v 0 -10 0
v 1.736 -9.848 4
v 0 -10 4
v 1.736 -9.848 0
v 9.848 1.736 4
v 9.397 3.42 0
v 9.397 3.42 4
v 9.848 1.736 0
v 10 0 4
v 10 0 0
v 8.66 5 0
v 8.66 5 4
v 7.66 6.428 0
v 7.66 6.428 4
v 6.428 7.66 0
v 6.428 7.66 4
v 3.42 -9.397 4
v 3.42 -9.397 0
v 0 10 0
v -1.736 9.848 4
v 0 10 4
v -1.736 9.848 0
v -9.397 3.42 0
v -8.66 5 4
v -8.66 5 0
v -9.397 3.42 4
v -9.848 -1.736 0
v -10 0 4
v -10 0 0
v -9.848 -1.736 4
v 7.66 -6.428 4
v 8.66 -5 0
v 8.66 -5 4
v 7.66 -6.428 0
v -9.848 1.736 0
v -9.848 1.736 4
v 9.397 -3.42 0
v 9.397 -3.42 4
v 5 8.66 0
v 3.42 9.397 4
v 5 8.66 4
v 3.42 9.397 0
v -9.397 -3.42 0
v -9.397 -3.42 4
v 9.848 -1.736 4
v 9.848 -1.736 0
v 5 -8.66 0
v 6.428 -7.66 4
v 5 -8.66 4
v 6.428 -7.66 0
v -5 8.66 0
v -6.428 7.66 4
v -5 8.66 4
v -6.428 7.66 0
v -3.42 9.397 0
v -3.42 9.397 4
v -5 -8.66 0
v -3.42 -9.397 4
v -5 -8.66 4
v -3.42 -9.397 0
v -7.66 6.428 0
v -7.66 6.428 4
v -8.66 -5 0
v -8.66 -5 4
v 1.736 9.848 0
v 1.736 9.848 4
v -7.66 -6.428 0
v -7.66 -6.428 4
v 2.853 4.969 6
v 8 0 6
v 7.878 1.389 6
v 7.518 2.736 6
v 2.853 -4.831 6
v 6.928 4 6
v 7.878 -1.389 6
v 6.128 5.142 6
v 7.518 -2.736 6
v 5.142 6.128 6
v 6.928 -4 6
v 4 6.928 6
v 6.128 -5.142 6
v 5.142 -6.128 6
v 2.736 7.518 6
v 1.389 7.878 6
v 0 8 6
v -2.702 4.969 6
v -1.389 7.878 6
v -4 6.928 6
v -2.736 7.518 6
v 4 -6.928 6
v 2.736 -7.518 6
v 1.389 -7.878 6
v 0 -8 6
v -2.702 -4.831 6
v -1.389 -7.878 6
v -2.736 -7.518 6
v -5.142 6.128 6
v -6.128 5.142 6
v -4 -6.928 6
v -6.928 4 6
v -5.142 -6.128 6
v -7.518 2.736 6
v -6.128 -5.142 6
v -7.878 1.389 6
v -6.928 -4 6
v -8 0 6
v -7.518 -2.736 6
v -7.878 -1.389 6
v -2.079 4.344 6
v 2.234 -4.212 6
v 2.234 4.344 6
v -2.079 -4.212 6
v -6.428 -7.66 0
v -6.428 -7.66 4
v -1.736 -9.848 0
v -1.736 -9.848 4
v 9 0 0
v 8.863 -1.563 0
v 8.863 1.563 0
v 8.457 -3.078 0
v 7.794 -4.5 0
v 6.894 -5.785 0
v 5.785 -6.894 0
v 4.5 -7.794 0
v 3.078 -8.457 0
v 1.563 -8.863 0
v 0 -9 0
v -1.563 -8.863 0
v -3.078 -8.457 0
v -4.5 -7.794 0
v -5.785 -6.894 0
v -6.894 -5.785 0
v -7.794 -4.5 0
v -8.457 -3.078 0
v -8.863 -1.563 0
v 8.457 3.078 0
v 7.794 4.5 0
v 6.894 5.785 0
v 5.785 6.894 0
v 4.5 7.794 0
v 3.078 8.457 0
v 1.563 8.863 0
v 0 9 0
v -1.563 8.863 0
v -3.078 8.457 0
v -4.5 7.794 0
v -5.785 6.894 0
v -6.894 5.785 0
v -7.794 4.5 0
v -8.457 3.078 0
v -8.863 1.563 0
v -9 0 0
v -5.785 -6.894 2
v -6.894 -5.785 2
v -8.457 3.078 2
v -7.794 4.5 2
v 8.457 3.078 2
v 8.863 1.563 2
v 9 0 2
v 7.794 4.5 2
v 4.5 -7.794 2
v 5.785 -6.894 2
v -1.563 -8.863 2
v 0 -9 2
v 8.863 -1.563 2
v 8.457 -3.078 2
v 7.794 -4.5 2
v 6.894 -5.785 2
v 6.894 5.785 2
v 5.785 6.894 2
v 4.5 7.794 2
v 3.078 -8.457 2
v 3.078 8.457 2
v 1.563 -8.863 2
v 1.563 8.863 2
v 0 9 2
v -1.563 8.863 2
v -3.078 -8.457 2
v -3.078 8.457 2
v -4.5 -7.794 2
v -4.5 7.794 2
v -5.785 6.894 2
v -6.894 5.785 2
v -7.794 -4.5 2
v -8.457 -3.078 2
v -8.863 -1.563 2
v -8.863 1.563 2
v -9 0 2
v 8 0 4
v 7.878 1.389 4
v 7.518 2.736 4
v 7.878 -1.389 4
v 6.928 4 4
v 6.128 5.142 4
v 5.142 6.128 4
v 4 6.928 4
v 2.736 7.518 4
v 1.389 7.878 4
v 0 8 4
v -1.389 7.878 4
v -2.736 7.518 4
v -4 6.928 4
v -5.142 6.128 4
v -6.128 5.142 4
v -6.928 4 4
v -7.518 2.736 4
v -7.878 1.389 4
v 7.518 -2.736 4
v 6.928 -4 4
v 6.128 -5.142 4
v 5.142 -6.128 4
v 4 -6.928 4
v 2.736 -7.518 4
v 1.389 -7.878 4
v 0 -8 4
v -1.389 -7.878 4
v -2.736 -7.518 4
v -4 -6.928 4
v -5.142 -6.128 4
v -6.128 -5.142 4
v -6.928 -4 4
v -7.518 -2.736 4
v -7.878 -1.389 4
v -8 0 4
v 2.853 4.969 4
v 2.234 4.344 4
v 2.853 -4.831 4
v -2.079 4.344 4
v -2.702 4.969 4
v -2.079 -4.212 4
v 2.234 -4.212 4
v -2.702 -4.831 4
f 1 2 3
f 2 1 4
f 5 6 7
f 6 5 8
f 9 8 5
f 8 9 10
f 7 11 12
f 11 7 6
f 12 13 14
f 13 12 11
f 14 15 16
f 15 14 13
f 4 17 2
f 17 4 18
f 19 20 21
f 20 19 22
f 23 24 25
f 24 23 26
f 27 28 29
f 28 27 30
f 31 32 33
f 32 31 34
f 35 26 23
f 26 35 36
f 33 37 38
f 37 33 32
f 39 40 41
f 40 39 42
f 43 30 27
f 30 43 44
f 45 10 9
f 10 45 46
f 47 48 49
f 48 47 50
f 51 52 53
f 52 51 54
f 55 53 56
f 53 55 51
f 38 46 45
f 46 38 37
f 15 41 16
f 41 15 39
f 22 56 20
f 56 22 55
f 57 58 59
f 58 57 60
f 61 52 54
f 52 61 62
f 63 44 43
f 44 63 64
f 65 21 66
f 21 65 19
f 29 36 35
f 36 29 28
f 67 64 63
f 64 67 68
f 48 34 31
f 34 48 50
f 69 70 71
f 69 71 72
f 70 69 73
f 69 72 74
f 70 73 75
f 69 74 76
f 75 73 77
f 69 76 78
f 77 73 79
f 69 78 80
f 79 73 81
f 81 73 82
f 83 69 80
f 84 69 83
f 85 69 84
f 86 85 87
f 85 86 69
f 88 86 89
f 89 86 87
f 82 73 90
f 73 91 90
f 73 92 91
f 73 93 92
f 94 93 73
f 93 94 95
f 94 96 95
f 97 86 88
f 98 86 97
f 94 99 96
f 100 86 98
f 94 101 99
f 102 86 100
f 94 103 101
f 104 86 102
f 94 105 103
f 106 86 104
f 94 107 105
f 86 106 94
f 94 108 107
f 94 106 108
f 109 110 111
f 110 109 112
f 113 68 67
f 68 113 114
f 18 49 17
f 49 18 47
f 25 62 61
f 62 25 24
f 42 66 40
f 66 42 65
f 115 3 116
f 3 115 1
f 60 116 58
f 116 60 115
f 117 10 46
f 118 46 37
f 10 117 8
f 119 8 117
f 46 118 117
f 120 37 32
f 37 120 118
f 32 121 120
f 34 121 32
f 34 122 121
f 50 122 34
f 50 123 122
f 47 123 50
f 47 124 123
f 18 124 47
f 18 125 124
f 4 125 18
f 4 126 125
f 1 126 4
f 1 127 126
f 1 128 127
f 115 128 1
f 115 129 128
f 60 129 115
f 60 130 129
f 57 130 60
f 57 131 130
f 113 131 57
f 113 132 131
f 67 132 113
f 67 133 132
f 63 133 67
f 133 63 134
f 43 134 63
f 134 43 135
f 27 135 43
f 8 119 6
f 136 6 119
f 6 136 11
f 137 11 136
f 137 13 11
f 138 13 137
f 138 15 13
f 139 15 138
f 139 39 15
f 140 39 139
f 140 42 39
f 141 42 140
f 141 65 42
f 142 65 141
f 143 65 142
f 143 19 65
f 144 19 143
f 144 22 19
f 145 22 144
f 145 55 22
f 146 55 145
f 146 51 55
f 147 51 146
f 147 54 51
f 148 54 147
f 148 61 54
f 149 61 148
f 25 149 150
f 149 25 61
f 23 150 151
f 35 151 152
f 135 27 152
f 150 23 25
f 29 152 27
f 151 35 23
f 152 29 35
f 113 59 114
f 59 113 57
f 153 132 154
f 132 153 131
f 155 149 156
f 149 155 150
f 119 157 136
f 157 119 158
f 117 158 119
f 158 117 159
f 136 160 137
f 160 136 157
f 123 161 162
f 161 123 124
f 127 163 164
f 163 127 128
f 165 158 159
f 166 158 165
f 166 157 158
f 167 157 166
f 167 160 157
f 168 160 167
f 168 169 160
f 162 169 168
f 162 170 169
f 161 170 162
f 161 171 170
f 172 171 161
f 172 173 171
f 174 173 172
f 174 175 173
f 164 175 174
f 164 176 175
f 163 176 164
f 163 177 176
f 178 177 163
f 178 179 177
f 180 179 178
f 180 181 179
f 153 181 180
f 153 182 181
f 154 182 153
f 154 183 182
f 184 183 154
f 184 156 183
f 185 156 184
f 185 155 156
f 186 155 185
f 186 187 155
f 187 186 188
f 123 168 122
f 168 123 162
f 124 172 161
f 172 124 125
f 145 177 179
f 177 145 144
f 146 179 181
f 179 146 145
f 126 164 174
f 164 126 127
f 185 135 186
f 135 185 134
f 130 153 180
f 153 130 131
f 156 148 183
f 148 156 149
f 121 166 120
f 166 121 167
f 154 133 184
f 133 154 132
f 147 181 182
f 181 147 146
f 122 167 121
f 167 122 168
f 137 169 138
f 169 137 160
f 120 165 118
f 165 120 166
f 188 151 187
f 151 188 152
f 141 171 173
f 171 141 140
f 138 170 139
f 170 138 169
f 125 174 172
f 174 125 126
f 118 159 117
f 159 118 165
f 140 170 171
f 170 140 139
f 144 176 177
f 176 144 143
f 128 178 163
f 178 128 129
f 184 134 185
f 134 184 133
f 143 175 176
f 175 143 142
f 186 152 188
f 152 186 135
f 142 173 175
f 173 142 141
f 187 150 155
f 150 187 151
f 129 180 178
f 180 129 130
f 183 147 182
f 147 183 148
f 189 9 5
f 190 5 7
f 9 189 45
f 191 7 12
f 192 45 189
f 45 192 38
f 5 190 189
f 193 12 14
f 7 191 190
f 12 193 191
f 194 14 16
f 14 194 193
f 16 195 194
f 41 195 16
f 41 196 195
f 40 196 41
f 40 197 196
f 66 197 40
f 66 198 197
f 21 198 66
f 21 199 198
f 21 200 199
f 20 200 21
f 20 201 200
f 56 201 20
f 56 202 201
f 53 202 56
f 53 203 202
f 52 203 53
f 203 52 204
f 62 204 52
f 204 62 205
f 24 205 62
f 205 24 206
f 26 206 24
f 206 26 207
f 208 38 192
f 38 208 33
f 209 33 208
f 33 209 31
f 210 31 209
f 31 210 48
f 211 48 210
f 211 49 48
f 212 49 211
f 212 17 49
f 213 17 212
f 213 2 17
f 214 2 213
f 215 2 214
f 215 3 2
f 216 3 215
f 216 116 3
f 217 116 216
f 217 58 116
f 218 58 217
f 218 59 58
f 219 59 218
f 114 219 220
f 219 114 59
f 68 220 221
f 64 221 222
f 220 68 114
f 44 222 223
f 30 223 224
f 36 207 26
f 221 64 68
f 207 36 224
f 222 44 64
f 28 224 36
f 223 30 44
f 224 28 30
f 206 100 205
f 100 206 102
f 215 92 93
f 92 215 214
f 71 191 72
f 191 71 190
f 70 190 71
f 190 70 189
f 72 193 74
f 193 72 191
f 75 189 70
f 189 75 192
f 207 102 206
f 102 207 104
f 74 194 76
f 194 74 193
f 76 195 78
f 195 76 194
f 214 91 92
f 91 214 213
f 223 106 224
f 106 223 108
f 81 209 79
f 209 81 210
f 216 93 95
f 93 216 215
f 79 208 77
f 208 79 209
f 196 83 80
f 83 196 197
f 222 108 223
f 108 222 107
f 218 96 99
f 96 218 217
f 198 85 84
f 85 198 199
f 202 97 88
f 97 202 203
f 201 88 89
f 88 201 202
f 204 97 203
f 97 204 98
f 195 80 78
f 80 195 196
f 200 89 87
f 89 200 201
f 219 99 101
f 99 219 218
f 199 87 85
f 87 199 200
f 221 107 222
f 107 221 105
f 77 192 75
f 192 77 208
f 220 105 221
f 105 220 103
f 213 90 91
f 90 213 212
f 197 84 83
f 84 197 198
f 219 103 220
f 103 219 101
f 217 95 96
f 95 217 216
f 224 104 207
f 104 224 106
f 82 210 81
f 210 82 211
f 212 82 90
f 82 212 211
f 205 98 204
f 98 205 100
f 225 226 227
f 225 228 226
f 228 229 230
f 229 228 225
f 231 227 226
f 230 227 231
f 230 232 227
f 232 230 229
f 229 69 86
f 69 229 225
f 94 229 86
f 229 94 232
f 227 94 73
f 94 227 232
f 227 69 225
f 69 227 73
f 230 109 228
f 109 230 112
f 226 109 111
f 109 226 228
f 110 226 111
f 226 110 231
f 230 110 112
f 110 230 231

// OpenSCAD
difference() {
	difference() {
		difference() {
			cylinder($fn = 36, h = 6, r = 10);
			translate(v = [0, 0, -1]) {
				cylinder($fn = 36, h = 3, r = 9);
			}
		}
		translate(v = [0, 0, 4]) {
			difference() {
				cylinder($fn = 36, h = 3, r = 10.5000000000);
				cylinder($fn = 36, h = 3, r = 8);
			}
		}
	}
	translate(v = [0, 0, 4]) {
		linear_extrude(height = 3) {
			text(font = "mana", halign = "center", size = 8, text = "\uE603", valign = "center");
		}
	}
}
